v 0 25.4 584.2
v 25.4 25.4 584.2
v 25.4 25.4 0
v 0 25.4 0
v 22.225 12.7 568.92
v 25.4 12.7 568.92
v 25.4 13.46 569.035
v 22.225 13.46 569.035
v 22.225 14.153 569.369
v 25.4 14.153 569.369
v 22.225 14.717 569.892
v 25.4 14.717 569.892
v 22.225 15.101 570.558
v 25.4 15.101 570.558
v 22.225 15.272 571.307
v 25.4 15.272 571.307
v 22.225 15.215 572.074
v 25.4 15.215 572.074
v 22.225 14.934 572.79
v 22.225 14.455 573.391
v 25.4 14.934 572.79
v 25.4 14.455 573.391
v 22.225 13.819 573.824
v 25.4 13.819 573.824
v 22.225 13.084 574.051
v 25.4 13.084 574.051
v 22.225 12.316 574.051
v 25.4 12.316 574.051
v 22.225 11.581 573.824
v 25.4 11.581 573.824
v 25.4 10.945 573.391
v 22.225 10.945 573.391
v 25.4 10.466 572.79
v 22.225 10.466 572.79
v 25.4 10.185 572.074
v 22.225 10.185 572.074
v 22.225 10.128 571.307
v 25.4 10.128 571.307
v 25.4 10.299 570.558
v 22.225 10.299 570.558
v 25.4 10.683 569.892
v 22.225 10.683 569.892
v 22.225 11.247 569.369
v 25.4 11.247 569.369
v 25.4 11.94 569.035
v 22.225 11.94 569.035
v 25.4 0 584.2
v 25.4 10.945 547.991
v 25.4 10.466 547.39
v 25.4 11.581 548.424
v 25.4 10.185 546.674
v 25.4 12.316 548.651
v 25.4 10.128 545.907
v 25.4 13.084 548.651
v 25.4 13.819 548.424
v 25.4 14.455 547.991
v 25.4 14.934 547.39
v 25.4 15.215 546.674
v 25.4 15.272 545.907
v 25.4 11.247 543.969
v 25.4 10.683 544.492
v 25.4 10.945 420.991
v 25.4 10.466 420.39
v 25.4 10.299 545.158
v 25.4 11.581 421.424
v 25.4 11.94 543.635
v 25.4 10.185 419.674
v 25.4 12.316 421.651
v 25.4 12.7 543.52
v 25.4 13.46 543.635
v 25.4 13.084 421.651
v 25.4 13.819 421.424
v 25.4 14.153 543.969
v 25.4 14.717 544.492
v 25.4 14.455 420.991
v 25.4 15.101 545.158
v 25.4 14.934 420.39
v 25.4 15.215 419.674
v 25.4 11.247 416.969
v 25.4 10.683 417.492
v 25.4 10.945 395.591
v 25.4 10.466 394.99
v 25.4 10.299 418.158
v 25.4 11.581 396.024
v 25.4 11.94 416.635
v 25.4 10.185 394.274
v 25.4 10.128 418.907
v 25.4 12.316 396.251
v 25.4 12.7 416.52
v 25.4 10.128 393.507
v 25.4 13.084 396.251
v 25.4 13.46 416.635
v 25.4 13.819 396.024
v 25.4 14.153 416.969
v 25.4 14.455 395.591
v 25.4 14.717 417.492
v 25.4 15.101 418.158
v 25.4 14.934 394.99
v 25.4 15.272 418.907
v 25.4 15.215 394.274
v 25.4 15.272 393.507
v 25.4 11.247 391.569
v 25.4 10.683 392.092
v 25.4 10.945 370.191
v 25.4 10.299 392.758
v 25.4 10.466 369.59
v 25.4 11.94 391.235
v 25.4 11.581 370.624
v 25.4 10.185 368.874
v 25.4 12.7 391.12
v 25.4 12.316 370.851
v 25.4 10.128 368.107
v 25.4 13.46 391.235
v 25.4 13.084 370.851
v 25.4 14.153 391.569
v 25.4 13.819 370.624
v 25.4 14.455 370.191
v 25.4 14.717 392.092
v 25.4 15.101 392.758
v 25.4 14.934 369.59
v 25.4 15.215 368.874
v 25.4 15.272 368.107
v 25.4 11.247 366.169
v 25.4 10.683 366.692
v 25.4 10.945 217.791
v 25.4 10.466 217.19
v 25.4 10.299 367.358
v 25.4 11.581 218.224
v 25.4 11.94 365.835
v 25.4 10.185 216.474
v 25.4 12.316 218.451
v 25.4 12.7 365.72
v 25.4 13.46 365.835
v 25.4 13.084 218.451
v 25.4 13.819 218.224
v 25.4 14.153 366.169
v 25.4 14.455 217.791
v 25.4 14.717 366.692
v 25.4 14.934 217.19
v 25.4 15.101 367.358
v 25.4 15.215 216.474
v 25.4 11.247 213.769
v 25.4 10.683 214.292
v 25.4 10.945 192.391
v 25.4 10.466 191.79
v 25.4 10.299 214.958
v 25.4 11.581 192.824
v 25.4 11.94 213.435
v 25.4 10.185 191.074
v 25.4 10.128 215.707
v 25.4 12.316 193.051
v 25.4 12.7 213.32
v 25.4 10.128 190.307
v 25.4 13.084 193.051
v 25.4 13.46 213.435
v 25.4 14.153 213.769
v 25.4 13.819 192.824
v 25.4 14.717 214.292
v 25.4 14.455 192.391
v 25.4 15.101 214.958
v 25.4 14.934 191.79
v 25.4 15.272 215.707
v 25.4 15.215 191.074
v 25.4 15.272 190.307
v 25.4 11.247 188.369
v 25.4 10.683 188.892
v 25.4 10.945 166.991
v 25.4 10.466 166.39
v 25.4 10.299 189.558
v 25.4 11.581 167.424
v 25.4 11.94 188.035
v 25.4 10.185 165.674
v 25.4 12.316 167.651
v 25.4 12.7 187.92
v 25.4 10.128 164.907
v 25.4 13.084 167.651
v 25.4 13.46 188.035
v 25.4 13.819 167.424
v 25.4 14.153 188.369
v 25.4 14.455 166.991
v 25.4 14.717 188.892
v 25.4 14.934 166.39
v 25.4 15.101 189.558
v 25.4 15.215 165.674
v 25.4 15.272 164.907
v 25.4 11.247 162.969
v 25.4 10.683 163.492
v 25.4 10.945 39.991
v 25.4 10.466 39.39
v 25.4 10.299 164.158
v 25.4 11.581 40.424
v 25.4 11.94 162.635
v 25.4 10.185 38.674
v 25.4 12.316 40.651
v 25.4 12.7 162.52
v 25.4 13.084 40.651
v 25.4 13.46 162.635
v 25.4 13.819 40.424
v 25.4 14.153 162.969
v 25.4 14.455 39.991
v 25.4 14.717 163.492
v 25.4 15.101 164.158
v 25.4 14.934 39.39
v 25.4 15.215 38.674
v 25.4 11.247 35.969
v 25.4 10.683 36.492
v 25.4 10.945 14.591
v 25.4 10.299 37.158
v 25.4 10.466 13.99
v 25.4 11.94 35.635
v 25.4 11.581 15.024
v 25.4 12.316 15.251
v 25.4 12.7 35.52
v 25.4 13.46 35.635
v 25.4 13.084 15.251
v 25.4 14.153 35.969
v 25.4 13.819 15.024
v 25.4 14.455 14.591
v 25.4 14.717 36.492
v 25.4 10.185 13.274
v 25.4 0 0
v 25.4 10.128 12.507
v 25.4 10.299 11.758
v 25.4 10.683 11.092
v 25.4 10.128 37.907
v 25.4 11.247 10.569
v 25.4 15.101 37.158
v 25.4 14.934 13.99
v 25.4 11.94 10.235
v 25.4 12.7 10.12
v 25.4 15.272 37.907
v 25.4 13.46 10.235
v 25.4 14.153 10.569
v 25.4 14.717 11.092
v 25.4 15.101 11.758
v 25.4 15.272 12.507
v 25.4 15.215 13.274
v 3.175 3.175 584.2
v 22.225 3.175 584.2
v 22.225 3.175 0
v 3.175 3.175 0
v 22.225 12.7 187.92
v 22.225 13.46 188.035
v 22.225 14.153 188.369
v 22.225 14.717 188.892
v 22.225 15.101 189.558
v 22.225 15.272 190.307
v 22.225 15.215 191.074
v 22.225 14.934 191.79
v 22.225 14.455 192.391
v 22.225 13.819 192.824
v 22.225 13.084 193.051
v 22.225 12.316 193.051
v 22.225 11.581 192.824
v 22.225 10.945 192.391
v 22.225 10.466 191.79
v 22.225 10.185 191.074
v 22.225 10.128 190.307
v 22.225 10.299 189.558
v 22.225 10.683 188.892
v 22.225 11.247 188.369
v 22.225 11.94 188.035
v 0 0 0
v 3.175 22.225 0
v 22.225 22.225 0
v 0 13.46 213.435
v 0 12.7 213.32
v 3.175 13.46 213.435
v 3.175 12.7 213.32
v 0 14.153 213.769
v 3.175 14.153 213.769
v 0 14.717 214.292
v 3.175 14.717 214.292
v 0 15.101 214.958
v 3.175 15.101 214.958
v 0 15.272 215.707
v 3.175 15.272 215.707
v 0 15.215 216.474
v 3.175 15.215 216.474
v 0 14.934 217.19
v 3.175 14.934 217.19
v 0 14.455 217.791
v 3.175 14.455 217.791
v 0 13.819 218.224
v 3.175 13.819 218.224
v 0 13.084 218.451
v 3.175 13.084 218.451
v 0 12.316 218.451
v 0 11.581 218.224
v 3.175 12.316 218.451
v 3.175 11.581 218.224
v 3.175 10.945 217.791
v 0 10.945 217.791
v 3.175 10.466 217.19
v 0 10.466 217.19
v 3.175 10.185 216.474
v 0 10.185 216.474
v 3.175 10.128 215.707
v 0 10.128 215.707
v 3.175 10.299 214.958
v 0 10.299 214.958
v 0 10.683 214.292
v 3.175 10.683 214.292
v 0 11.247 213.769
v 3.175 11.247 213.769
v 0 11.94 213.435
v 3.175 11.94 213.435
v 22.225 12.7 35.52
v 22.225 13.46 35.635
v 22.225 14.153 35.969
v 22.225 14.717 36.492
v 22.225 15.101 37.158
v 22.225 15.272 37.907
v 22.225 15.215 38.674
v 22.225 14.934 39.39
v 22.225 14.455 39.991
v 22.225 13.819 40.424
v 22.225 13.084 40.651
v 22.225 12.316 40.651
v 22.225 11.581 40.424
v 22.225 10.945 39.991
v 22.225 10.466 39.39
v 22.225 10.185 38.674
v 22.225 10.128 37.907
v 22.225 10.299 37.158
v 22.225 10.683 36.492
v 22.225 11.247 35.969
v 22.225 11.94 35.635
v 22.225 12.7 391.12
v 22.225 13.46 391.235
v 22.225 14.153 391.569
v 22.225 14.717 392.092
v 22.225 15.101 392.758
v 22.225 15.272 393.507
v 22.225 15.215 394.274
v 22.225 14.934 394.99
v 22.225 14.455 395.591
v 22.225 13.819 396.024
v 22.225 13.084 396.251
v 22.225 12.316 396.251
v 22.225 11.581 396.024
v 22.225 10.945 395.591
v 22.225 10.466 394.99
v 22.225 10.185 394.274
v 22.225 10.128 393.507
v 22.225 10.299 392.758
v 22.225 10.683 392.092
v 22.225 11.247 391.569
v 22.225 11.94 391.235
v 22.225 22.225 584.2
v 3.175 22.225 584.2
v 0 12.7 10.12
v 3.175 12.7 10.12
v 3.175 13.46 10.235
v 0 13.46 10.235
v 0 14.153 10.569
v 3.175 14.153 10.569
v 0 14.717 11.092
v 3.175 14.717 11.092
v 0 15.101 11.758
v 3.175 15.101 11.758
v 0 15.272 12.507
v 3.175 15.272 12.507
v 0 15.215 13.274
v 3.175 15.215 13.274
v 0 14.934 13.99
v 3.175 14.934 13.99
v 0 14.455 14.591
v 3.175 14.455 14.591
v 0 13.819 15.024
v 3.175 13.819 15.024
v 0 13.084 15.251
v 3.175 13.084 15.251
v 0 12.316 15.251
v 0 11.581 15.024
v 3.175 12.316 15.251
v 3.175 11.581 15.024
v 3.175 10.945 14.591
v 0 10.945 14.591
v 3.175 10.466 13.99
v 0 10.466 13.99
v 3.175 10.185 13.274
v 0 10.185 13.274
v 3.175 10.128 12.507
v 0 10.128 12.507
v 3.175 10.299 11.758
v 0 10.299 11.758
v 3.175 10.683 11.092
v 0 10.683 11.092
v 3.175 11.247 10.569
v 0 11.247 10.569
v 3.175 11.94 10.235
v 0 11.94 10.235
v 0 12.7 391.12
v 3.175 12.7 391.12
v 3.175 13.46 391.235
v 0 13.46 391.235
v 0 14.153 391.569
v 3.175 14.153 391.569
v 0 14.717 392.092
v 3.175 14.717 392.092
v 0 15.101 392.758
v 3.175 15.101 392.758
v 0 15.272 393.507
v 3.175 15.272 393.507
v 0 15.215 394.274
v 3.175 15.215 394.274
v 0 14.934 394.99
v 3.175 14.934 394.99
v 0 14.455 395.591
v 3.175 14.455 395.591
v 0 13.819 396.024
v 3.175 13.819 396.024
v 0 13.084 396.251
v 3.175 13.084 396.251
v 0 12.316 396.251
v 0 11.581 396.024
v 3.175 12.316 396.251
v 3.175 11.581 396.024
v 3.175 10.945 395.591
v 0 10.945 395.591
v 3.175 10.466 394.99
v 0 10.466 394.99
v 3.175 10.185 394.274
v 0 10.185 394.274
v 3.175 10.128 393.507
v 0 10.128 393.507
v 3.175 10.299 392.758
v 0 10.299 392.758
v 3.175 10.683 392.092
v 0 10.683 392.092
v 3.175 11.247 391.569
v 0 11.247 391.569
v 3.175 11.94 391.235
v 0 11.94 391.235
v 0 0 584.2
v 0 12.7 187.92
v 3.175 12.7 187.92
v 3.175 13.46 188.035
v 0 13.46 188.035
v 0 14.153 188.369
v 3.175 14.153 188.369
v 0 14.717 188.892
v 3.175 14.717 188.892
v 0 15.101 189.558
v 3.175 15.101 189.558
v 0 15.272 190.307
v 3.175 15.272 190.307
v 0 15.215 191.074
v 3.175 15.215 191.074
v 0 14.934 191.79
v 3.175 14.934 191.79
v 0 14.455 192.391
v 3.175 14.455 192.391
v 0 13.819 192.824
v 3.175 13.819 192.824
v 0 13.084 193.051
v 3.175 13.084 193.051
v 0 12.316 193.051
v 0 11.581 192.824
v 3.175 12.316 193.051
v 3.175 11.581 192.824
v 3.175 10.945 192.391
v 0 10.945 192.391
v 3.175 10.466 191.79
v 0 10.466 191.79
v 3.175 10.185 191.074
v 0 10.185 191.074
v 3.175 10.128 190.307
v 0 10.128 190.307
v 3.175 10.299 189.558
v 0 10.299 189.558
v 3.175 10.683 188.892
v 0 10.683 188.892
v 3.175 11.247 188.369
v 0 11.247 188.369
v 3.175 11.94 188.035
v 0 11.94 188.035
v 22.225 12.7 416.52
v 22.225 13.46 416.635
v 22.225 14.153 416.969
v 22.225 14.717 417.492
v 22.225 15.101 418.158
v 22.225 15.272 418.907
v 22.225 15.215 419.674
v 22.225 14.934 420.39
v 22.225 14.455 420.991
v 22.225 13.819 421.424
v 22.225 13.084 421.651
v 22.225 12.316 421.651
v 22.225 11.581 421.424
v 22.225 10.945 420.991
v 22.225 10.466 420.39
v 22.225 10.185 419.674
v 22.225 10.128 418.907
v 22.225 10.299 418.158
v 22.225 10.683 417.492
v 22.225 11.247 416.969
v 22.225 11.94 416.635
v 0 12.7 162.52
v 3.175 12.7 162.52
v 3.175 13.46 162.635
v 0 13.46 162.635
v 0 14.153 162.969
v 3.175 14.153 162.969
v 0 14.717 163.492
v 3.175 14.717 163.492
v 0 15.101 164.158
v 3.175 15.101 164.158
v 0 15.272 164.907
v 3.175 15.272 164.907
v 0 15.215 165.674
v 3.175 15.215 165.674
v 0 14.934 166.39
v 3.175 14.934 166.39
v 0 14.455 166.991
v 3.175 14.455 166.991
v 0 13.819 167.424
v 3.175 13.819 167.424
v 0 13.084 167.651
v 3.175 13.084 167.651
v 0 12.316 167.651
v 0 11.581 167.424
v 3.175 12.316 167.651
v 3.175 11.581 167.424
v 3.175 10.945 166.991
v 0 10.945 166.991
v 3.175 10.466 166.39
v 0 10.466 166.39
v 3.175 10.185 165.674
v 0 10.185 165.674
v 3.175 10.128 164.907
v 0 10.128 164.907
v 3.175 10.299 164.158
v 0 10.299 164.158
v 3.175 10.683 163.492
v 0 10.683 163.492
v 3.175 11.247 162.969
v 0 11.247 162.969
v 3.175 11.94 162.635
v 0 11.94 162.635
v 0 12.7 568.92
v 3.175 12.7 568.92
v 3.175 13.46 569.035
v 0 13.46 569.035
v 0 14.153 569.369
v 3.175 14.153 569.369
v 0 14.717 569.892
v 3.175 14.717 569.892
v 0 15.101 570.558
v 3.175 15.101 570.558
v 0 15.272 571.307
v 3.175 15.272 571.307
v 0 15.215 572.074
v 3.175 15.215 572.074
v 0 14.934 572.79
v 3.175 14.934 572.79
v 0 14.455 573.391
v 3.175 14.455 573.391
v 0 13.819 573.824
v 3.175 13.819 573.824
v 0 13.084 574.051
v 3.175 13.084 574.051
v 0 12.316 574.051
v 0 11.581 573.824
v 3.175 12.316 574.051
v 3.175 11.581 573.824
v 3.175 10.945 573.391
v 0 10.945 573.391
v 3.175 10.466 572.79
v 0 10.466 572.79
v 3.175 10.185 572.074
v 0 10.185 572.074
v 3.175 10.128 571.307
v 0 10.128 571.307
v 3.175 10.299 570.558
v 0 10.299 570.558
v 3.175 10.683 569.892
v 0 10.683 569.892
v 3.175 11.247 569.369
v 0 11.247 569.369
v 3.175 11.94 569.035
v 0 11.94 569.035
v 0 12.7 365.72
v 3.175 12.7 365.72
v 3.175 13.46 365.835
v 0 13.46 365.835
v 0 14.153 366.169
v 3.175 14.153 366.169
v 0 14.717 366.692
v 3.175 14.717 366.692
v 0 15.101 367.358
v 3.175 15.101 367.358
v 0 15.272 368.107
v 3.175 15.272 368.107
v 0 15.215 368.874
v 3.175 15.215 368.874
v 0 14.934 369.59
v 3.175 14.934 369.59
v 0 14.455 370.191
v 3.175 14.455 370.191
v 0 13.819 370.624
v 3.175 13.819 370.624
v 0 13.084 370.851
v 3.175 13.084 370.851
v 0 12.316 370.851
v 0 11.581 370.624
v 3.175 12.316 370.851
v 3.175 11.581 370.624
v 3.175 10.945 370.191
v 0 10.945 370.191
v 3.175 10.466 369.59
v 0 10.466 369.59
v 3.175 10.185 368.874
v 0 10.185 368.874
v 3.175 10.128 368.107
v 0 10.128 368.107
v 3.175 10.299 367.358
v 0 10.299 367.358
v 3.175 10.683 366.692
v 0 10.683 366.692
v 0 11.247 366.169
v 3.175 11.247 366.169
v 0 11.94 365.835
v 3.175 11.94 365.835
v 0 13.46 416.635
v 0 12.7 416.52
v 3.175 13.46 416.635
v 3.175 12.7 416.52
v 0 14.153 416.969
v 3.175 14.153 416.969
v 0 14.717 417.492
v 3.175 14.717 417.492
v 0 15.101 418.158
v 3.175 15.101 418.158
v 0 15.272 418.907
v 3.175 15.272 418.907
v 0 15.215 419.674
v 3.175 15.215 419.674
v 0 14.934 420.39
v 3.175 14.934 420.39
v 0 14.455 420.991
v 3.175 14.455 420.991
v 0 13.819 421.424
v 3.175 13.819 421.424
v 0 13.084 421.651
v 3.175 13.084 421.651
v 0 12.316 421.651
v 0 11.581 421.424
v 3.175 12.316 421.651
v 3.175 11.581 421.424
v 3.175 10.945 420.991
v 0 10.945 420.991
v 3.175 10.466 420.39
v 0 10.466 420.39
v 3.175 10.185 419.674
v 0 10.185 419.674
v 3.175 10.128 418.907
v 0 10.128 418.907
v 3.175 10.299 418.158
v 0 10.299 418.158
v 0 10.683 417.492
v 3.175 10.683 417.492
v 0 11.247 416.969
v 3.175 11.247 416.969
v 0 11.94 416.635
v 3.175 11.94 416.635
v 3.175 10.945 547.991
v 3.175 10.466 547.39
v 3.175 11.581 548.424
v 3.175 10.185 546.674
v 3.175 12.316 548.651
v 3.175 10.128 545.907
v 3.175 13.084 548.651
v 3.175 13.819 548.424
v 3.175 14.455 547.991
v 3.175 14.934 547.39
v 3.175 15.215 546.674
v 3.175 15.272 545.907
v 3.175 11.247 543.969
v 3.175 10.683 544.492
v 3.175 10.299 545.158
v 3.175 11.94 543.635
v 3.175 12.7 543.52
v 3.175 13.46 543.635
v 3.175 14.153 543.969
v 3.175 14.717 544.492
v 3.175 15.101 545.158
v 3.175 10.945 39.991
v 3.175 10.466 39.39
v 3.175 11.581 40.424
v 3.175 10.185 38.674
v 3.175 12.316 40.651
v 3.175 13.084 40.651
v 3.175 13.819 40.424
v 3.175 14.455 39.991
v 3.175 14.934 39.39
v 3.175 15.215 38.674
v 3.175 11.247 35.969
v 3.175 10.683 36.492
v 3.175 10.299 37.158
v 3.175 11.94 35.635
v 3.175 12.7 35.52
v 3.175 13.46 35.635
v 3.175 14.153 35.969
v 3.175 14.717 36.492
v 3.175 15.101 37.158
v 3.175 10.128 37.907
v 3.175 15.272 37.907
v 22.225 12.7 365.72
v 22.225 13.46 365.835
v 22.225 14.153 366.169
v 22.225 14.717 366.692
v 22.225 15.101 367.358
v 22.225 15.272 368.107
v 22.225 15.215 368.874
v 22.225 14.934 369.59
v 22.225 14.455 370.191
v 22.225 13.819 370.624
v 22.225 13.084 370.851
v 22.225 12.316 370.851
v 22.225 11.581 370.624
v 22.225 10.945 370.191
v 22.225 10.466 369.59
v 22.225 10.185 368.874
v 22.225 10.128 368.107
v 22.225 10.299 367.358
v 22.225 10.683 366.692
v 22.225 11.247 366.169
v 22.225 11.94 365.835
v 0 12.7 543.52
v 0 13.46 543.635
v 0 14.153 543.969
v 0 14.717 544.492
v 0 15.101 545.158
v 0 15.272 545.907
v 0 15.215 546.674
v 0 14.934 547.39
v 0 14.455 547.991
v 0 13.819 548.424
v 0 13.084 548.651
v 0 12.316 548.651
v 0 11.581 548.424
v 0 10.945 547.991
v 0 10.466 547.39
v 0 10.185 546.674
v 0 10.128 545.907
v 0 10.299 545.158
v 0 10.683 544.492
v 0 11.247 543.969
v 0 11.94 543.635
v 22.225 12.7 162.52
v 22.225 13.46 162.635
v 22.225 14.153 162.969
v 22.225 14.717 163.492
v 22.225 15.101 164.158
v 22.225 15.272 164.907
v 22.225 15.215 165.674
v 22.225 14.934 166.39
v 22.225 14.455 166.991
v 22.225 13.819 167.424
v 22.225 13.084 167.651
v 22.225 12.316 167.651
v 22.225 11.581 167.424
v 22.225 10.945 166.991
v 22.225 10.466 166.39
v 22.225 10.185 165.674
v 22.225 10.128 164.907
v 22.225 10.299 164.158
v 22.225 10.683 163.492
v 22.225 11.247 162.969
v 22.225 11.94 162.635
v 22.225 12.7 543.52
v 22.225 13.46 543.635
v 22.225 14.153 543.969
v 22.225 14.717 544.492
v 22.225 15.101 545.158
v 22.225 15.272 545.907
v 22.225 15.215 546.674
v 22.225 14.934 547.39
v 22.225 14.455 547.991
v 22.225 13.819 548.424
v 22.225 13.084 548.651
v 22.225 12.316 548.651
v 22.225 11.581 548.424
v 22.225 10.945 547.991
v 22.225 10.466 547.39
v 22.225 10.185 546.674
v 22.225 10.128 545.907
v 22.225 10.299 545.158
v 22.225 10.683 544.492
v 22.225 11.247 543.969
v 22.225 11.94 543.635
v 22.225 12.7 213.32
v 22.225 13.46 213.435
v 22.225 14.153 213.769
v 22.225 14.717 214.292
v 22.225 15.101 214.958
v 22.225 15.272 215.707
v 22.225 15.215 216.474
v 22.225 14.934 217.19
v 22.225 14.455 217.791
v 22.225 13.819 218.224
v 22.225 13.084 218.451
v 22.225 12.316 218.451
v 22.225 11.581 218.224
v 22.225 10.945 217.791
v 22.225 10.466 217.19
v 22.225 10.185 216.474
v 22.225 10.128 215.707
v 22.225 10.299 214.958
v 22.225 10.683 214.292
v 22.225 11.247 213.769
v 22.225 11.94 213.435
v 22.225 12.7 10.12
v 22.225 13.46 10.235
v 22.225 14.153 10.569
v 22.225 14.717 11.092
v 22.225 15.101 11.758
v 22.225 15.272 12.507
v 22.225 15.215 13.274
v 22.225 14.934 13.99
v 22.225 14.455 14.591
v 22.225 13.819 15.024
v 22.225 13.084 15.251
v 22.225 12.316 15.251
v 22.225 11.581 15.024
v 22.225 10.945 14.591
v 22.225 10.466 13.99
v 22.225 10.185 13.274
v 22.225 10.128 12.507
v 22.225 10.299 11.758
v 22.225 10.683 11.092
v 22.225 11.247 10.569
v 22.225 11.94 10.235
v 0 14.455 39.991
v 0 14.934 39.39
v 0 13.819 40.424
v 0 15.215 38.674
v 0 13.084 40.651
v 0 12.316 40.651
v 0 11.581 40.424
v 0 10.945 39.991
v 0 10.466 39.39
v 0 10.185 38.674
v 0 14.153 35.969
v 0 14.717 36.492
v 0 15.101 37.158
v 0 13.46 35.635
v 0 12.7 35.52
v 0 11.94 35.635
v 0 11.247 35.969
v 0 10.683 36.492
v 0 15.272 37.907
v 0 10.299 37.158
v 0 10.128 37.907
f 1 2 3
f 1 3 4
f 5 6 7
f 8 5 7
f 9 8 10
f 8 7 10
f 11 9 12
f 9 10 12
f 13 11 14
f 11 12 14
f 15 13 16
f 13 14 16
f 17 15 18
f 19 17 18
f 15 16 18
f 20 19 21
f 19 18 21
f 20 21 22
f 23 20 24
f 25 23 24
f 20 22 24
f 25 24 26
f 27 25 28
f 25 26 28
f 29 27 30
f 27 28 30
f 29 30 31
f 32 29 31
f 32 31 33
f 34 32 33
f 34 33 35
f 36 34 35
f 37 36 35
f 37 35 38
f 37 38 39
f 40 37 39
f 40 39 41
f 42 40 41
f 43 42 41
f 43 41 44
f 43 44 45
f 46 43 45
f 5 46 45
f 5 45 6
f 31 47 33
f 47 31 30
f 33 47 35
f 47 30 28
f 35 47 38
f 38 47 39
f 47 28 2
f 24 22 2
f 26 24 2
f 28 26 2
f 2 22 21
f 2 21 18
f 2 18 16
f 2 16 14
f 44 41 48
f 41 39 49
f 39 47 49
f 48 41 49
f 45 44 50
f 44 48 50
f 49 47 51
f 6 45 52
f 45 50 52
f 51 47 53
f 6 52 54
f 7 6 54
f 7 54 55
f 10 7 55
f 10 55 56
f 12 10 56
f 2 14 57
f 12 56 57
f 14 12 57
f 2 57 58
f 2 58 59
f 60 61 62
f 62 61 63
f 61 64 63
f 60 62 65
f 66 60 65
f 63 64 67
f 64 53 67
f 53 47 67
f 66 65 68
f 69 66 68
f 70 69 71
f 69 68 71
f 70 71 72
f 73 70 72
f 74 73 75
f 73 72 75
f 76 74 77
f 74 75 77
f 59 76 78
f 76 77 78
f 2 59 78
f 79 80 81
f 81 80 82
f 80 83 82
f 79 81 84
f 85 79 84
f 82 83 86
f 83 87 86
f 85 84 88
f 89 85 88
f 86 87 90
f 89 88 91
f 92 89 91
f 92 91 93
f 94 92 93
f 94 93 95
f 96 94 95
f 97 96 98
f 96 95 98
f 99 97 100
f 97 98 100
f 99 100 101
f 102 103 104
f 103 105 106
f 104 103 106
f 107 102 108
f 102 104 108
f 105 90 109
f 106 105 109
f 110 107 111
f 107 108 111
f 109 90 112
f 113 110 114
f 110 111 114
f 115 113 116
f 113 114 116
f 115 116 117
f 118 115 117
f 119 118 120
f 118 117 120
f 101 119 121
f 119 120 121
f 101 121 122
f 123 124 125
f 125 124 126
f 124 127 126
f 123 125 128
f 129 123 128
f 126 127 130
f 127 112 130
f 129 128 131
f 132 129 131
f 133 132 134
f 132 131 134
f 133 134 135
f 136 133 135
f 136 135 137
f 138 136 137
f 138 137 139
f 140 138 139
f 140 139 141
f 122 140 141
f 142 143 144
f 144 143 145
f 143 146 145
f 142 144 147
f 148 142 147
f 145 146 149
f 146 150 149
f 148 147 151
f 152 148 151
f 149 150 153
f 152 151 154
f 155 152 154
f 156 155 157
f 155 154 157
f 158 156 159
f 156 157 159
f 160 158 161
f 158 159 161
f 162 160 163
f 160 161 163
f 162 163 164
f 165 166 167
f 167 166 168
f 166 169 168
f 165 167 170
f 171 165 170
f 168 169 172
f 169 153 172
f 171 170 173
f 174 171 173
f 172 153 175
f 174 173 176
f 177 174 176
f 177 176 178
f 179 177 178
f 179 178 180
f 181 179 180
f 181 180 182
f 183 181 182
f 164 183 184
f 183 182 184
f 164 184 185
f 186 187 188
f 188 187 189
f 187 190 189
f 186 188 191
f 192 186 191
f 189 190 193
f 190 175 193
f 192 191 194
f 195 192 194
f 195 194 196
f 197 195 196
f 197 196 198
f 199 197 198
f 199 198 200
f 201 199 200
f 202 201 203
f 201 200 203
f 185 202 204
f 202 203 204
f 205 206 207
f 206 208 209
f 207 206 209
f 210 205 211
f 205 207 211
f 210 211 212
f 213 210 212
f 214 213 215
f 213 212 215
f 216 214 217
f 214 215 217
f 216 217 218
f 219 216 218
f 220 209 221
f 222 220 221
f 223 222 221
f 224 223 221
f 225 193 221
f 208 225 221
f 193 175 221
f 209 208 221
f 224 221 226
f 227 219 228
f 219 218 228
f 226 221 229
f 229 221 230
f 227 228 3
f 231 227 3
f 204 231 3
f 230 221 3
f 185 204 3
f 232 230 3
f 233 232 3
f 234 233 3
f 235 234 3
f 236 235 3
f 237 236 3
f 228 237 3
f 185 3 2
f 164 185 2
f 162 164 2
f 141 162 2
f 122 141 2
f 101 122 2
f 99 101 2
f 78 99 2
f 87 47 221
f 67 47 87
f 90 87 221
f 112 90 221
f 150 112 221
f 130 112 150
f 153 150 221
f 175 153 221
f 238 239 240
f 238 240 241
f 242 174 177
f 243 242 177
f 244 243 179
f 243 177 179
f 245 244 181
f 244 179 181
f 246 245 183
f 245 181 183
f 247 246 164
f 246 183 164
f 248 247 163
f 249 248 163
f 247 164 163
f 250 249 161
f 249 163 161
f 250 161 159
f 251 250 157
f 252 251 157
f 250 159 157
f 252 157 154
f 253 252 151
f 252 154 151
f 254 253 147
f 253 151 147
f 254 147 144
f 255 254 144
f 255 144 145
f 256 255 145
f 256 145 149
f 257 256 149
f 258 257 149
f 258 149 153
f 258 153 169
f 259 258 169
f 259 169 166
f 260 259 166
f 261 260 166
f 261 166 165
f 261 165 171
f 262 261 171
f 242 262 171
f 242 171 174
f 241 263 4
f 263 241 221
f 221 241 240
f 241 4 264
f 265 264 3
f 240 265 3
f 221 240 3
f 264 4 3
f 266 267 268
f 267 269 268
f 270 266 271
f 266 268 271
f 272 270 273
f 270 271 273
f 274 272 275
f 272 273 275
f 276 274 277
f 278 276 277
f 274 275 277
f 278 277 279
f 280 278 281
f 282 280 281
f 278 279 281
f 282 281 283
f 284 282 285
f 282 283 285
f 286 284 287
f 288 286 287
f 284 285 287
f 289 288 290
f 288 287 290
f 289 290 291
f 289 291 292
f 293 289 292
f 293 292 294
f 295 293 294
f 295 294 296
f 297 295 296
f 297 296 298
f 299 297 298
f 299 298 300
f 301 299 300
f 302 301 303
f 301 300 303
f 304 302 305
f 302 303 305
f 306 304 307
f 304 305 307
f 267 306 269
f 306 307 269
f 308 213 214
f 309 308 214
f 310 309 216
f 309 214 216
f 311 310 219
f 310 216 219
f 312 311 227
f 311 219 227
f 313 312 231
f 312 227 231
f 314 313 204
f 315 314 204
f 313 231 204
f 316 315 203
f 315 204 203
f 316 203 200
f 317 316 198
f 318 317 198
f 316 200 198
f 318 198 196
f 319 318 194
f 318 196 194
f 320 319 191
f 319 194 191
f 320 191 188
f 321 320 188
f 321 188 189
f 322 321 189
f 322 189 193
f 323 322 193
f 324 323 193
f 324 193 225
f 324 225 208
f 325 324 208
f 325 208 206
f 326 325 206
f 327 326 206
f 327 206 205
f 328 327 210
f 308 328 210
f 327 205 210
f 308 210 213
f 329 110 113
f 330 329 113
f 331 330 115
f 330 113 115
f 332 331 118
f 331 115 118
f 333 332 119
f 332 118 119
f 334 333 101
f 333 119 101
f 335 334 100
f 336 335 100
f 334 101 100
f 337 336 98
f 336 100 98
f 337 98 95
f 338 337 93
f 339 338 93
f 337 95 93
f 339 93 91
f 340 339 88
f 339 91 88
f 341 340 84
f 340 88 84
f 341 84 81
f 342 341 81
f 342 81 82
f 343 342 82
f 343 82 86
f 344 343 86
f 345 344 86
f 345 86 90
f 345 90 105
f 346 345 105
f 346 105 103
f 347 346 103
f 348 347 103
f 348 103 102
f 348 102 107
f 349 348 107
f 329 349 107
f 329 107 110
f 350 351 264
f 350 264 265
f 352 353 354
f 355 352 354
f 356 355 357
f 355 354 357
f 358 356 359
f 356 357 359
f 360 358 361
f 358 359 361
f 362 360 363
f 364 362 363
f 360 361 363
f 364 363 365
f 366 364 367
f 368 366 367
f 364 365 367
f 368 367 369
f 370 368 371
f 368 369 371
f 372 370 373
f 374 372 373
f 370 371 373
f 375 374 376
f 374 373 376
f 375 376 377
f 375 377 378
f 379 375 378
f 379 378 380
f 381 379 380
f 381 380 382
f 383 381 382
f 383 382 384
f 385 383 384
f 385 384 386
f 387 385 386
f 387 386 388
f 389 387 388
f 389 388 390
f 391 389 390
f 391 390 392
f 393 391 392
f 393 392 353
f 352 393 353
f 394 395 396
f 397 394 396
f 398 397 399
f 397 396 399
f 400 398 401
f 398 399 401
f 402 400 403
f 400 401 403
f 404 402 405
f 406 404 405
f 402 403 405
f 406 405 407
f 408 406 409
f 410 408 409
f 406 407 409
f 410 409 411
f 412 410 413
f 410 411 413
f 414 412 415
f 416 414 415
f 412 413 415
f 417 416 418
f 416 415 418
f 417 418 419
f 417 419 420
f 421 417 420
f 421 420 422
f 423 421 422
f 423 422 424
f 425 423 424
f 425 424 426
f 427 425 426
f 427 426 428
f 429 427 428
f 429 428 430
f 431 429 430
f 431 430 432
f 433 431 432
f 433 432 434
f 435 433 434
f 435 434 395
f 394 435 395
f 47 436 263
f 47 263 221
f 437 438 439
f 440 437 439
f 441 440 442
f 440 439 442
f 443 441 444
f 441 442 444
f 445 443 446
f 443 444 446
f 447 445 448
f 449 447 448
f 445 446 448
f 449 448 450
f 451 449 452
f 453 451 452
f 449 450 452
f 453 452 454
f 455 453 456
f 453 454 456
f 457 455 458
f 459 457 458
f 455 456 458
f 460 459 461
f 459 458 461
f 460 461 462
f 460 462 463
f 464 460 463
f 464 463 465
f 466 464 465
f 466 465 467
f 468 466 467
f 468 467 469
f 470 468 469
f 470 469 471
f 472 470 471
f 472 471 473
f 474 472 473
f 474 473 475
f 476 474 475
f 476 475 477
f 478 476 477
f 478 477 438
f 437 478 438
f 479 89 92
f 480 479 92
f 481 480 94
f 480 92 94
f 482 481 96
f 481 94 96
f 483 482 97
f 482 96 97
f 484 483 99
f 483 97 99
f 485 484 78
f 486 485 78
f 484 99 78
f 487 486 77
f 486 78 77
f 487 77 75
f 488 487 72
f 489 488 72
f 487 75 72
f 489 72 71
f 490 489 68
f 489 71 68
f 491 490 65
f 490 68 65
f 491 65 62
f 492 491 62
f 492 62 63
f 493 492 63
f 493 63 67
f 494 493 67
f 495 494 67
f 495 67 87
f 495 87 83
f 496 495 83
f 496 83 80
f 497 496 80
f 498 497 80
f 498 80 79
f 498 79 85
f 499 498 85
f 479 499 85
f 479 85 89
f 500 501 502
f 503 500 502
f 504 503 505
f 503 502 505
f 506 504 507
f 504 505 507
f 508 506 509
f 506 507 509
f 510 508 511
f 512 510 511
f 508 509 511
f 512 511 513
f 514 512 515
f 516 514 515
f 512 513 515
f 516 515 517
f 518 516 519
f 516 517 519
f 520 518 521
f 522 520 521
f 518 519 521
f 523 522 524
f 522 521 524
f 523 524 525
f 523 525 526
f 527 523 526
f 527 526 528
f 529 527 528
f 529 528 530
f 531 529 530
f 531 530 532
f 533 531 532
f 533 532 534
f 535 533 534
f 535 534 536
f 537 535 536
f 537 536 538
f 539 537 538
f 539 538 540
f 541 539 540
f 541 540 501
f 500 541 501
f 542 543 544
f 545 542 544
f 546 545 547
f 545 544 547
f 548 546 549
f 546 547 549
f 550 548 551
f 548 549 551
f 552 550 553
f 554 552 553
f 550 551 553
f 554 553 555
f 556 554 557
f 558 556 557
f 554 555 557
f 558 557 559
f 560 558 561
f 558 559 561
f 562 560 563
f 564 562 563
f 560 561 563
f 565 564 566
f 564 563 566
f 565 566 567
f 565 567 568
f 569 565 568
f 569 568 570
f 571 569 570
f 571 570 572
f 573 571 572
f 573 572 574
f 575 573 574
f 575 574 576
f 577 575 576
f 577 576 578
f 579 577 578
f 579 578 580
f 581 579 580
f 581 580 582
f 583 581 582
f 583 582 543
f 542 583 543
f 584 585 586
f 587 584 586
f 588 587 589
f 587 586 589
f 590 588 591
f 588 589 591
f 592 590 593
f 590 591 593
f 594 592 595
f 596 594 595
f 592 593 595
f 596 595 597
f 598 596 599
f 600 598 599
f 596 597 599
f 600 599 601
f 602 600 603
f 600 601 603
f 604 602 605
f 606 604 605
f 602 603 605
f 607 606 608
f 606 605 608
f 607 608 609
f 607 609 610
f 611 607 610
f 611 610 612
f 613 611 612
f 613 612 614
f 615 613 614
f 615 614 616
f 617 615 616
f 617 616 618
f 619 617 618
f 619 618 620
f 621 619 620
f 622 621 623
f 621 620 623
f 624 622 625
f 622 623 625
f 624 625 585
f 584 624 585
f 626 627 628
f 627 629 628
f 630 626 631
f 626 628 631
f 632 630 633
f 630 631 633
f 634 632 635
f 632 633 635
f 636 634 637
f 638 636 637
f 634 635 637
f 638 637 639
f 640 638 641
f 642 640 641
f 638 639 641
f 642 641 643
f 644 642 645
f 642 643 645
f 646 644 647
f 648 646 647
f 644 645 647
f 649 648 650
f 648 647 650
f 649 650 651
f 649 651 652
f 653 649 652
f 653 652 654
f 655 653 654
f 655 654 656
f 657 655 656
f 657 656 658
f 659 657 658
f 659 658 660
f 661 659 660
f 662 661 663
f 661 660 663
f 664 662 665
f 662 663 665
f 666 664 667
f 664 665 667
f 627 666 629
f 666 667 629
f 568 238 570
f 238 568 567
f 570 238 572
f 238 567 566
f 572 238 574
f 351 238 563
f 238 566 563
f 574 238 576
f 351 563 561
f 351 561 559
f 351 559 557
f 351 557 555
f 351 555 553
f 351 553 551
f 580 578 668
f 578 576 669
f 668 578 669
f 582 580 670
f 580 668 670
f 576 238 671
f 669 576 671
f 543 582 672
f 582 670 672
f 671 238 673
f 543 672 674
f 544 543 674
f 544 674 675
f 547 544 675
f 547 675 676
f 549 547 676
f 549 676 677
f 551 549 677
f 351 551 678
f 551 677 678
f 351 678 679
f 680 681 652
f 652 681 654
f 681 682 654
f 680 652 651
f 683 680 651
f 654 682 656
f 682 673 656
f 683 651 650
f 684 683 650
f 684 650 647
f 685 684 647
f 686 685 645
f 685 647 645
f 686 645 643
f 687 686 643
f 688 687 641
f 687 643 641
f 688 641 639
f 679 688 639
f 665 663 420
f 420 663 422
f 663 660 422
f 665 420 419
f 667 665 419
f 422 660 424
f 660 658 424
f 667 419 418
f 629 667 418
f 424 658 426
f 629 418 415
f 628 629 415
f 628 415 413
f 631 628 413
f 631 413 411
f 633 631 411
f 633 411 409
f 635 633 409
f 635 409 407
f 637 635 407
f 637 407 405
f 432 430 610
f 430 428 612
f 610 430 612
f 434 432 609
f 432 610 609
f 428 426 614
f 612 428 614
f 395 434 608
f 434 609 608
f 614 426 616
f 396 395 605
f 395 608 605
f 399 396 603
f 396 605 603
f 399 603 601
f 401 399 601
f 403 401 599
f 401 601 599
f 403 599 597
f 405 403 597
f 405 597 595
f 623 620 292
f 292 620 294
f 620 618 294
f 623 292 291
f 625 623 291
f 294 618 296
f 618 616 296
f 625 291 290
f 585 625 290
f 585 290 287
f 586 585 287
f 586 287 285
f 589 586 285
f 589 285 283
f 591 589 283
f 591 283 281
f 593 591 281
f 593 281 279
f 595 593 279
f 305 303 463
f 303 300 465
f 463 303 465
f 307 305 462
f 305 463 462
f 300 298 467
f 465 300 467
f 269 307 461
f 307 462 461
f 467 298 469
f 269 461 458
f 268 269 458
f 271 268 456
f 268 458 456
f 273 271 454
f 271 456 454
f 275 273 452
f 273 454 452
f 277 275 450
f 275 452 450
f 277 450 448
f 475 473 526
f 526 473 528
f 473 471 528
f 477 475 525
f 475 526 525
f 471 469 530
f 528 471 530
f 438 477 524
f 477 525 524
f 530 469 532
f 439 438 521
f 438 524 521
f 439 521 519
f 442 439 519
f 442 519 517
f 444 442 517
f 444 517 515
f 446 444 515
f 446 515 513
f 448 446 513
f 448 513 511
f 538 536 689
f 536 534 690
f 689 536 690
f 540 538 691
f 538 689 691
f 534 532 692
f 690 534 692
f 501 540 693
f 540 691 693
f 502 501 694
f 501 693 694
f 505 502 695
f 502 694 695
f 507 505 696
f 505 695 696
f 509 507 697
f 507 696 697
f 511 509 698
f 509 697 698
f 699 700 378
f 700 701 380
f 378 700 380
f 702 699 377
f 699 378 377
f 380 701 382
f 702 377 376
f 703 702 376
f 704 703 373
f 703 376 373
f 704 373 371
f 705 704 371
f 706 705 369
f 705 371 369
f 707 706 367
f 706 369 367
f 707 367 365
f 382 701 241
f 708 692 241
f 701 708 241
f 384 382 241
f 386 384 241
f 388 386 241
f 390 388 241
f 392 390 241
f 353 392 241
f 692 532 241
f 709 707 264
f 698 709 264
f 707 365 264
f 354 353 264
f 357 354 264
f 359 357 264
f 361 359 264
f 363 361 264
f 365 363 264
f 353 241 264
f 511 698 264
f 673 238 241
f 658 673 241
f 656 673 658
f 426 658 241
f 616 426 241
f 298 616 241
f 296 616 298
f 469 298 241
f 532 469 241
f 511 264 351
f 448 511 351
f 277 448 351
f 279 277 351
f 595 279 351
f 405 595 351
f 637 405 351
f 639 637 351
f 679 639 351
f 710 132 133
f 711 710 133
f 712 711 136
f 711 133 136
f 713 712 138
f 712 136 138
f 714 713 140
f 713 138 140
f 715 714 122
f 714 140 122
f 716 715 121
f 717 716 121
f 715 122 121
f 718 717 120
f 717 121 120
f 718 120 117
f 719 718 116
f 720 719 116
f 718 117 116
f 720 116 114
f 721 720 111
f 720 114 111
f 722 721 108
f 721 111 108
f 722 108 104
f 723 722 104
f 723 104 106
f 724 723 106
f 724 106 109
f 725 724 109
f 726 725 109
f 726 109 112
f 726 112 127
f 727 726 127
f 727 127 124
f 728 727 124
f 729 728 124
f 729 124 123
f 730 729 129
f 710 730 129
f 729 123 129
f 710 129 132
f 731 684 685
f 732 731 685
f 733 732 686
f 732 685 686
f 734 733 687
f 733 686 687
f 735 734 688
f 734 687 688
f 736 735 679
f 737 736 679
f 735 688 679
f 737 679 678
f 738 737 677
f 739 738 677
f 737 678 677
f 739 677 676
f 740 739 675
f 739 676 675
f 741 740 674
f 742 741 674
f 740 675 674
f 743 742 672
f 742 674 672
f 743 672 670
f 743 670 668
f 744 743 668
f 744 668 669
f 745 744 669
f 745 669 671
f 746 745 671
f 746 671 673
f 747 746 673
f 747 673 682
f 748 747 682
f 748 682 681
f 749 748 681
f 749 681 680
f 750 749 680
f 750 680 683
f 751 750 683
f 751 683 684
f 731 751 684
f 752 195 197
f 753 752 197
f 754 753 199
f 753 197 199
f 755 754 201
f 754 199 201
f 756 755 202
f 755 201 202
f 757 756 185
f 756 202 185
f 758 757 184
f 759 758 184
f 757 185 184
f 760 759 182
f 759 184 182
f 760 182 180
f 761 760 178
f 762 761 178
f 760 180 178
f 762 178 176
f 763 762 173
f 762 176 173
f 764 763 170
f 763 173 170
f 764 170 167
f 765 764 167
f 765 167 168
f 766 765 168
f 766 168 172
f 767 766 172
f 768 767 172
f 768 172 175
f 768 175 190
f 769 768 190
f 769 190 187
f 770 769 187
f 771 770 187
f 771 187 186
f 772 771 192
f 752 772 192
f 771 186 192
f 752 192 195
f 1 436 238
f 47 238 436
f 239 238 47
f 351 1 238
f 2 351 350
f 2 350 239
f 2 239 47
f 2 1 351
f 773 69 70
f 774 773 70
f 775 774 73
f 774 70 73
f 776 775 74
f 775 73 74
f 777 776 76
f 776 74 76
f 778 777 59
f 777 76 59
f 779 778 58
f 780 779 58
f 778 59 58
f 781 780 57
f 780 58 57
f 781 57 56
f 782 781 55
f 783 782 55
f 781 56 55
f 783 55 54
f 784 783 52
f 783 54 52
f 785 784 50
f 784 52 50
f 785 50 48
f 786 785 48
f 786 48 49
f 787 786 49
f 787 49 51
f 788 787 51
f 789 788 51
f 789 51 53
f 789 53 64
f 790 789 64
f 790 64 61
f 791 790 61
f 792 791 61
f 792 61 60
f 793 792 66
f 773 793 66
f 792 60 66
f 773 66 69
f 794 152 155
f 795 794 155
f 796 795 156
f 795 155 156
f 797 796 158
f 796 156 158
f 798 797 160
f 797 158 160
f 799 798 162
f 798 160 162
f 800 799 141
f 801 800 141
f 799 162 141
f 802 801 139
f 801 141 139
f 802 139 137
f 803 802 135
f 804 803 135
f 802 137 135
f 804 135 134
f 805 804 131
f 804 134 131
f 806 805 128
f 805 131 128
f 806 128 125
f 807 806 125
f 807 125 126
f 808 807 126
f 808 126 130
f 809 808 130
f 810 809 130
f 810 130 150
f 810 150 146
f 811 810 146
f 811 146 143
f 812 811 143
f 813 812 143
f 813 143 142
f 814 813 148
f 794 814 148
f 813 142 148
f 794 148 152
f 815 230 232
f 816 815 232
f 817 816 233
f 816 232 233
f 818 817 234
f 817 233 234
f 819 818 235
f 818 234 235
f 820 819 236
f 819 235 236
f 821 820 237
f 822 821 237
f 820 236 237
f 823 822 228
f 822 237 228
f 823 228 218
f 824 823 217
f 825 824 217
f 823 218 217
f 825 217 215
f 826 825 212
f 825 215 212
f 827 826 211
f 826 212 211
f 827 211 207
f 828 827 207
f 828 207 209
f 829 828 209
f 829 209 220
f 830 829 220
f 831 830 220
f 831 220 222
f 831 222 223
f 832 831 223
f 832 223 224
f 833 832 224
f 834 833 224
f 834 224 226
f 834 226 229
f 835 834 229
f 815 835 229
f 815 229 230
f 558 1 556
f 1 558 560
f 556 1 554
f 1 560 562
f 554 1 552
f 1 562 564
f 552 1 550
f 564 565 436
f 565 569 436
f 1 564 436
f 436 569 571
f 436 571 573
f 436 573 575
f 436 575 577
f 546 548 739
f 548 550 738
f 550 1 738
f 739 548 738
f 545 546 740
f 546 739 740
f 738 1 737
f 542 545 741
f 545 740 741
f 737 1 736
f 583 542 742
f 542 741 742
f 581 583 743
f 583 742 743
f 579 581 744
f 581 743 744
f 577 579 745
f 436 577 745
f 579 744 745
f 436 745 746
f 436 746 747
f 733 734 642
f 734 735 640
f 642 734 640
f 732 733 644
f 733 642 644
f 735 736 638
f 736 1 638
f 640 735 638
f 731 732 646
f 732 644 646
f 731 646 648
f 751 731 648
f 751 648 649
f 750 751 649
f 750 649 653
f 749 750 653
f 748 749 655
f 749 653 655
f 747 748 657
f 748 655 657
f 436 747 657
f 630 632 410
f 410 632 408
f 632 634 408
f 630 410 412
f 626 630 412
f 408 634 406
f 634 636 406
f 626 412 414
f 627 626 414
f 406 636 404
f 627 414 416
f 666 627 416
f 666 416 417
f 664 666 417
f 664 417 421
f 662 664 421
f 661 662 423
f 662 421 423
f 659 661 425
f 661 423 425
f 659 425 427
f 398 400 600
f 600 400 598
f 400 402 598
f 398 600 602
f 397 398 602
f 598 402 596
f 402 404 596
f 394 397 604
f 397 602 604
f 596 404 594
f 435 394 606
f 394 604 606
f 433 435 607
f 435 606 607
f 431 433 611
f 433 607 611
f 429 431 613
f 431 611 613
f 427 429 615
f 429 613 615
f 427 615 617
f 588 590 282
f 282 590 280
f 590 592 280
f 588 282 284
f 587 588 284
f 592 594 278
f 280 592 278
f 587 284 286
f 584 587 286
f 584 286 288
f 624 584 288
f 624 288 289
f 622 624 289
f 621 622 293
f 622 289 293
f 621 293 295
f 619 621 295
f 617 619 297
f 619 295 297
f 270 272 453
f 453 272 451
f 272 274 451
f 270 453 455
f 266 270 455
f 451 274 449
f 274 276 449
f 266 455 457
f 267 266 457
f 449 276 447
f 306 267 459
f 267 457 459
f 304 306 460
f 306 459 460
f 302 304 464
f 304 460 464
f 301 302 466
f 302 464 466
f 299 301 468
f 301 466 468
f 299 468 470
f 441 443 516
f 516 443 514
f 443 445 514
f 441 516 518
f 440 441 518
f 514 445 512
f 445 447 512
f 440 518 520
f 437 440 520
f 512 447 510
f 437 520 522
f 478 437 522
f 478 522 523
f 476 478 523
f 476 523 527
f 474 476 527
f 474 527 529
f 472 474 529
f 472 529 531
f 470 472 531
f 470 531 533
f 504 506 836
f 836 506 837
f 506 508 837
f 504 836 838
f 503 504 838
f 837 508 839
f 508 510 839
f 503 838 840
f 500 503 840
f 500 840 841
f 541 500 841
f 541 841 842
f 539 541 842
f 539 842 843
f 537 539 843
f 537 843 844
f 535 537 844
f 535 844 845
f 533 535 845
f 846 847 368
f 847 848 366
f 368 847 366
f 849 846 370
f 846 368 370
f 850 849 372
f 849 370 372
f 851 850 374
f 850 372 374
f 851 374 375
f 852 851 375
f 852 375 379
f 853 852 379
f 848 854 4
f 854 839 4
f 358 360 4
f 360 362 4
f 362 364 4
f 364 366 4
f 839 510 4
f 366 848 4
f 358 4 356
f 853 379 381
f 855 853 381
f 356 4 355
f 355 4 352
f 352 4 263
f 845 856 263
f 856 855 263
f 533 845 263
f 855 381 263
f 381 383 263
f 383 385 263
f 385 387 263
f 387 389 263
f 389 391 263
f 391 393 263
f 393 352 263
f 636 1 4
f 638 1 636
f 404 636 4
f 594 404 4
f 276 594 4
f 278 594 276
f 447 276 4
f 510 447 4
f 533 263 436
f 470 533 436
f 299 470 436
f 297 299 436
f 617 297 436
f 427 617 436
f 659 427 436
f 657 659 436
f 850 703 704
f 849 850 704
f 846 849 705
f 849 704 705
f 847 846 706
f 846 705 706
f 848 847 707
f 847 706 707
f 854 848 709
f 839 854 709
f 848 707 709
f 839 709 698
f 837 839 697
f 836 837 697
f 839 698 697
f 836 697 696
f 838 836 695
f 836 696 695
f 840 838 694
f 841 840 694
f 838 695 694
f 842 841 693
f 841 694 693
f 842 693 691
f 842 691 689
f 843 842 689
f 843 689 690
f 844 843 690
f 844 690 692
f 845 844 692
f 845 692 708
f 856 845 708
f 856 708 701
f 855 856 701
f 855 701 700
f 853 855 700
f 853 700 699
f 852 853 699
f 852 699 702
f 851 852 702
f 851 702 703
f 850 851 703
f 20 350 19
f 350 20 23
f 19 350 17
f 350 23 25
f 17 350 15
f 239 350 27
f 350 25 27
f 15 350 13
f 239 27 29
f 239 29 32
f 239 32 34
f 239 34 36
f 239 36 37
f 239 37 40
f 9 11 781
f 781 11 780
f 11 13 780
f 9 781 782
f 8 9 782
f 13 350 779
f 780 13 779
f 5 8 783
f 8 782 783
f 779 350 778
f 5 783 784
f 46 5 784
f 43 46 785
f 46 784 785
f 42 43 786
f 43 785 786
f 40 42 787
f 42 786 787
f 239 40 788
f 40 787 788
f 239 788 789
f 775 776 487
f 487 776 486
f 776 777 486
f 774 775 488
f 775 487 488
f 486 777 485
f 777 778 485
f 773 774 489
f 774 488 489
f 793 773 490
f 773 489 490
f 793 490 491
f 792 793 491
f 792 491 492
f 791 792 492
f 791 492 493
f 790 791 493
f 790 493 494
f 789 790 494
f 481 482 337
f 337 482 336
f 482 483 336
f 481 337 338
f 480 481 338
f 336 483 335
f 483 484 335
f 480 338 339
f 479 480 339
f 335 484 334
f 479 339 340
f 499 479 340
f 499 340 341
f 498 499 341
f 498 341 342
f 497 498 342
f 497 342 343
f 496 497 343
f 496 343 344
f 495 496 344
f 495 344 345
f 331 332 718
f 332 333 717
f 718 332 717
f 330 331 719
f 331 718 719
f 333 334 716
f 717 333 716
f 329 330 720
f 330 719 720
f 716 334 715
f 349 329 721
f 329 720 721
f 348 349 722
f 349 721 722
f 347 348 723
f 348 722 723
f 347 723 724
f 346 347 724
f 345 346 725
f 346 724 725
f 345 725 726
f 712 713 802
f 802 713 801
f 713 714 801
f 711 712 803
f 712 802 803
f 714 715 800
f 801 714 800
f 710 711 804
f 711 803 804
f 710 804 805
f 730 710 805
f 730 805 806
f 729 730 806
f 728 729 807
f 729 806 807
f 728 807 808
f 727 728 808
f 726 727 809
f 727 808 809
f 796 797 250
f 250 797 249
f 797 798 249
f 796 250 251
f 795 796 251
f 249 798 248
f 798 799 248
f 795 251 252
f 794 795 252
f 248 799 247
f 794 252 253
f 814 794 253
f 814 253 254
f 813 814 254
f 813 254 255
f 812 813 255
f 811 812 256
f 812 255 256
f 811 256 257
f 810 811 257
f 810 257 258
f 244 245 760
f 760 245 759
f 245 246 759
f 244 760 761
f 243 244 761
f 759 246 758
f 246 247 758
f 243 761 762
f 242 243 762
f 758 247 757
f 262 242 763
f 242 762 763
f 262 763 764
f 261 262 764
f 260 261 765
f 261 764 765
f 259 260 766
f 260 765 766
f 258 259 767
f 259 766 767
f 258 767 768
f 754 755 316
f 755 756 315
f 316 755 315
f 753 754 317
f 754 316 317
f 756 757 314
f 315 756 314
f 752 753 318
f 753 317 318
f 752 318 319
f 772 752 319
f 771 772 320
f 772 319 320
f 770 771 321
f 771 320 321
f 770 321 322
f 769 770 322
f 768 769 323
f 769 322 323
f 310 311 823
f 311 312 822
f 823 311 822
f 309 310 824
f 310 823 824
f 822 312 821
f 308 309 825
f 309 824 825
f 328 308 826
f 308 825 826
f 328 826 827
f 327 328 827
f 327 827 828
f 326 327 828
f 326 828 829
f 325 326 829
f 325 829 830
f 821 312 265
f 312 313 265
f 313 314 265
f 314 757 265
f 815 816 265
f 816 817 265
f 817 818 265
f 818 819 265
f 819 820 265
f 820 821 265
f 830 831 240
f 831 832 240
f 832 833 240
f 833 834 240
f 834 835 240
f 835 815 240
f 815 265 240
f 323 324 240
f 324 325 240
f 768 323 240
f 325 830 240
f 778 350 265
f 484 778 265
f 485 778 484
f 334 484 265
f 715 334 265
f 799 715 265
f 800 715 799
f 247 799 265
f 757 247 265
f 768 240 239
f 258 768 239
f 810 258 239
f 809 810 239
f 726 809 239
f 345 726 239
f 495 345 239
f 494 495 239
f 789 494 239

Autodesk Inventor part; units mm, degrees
ref_plane "YZ Plane" through (0, 0, 0) normal (1, 0, 0) x (0, 1, 0)
ref_plane "XZ Plane" through (0, 0, 0) normal (0, 1, 0) x (-1, 0, 0)
ref_plane "XY Plane" through (0, 0, 0) normal (0, 0, 1) x (1, 0, 0)
sketch "Sketch1" plane through (0, 0, 0) normal (0, 0, 1) x (1, 0, 0)
  line L0 (0, 0) -> (25.4, 0)
  line L1 (25.4, 0) -> (25.4, 25.4)
  line L2 (25.4, 25.4) -> (0, 25.4)
  line L3 (0, 25.4) -> (0, 0)
  line L4 (3.175, 22.225) -> (22.225, 22.225)
  line L5 (22.225, 22.225) -> (22.225, 3.175)
  line L6 (22.225, 3.175) -> (3.175, 3.175)
  line L7 (3.175, 3.175) -> (3.175, 22.225)
  dimension "d0" = 25.4
  dimension "d1" = 25.4
  dimension "d2" = 3.175
extrude "Extrusion1" add sketch "Sketch1" along normal blind 584.2
sketch "Sketch2" plane through (25.4, 0, 0) normal (1, 0, 0) x (0, 0, -1)
  line L0 (0, 3.175) -> (0, 22.225) construction
  line L1 (0, 12.7) -> (-12.7, 12.7) construction
  line L2 (-12.7, 12.7) -> (-38.1, 12.7) construction
  line L3 (-584.2, 22.225) -> (-584.2, 3.175) construction
  line L4 (-584.2, 12.7) -> (-571.5, 12.7) construction
  line L5 (-571.5, 12.7) -> (-546.1, 12.7) construction
  circle A0 centre (-571.5, 12.7) radius 2.5797
  circle A1 centre (-546.1, 12.7) radius 2.5797
  circle A2 centre (-38.1, 12.7) radius 2.5797
  circle A3 centre (-12.7, 12.7) radius 2.5797
  point P0 (0, 0)
  dimension "d5" = 12.7
  dimension "d6" = 25.4
  dimension "d7" = 12.7
  dimension "d8" = 25.4
  dimension "d9" = 5.1594
  dimension "d18" = 5.1594
  dimension "d19" = 5.1594
  dimension "d20" = 5.1594
extrude "Extrusion2" cut sketch "Sketch2" against normal blind 584.2
sketch "Sketch3" plane through (25.4, 0, 0) normal (1, 0, 0) x (0, 0, -1)
  line L0 (-584.2, 22.225) -> (-584.2, 3.175) construction
  line L1 (-584.2, 12.7) -> (-393.7, 12.7) construction
  circle A0 centre (-393.7, 12.7) radius 2.5797
  line L2 (-393.7, 12.7) -> (-419.1, 12.7) construction
  line L3 (-419.1, 12.7) -> (-368.3, 12.7) construction
  circle A1 centre (-419.1, 12.7) radius 2.5797
  circle A2 centre (-368.3, 12.7) radius 2.5797
  line L4 (0, 25.4) -> (-584.2, 25.4) construction
  line L5 (-292.1, 25.4) -> (-292.1, 0) construction
  circle A3 centre (-190.5, 12.7) radius 2.5797
  circle A4 centre (-165.1, 12.7) radius 2.5797
  circle A5 centre (-215.9, 12.7) radius 2.5797
  point P0 (0, 0)
  dimension "d12" = 190.5
  dimension "d13" = 5.1594
  dimension "d14" = 25.4
  dimension "d15" = 50.8
extrude "Extrusion3" cut sketch "Sketch3" against normal blind 584.2
properties part number "1x1 23in"
